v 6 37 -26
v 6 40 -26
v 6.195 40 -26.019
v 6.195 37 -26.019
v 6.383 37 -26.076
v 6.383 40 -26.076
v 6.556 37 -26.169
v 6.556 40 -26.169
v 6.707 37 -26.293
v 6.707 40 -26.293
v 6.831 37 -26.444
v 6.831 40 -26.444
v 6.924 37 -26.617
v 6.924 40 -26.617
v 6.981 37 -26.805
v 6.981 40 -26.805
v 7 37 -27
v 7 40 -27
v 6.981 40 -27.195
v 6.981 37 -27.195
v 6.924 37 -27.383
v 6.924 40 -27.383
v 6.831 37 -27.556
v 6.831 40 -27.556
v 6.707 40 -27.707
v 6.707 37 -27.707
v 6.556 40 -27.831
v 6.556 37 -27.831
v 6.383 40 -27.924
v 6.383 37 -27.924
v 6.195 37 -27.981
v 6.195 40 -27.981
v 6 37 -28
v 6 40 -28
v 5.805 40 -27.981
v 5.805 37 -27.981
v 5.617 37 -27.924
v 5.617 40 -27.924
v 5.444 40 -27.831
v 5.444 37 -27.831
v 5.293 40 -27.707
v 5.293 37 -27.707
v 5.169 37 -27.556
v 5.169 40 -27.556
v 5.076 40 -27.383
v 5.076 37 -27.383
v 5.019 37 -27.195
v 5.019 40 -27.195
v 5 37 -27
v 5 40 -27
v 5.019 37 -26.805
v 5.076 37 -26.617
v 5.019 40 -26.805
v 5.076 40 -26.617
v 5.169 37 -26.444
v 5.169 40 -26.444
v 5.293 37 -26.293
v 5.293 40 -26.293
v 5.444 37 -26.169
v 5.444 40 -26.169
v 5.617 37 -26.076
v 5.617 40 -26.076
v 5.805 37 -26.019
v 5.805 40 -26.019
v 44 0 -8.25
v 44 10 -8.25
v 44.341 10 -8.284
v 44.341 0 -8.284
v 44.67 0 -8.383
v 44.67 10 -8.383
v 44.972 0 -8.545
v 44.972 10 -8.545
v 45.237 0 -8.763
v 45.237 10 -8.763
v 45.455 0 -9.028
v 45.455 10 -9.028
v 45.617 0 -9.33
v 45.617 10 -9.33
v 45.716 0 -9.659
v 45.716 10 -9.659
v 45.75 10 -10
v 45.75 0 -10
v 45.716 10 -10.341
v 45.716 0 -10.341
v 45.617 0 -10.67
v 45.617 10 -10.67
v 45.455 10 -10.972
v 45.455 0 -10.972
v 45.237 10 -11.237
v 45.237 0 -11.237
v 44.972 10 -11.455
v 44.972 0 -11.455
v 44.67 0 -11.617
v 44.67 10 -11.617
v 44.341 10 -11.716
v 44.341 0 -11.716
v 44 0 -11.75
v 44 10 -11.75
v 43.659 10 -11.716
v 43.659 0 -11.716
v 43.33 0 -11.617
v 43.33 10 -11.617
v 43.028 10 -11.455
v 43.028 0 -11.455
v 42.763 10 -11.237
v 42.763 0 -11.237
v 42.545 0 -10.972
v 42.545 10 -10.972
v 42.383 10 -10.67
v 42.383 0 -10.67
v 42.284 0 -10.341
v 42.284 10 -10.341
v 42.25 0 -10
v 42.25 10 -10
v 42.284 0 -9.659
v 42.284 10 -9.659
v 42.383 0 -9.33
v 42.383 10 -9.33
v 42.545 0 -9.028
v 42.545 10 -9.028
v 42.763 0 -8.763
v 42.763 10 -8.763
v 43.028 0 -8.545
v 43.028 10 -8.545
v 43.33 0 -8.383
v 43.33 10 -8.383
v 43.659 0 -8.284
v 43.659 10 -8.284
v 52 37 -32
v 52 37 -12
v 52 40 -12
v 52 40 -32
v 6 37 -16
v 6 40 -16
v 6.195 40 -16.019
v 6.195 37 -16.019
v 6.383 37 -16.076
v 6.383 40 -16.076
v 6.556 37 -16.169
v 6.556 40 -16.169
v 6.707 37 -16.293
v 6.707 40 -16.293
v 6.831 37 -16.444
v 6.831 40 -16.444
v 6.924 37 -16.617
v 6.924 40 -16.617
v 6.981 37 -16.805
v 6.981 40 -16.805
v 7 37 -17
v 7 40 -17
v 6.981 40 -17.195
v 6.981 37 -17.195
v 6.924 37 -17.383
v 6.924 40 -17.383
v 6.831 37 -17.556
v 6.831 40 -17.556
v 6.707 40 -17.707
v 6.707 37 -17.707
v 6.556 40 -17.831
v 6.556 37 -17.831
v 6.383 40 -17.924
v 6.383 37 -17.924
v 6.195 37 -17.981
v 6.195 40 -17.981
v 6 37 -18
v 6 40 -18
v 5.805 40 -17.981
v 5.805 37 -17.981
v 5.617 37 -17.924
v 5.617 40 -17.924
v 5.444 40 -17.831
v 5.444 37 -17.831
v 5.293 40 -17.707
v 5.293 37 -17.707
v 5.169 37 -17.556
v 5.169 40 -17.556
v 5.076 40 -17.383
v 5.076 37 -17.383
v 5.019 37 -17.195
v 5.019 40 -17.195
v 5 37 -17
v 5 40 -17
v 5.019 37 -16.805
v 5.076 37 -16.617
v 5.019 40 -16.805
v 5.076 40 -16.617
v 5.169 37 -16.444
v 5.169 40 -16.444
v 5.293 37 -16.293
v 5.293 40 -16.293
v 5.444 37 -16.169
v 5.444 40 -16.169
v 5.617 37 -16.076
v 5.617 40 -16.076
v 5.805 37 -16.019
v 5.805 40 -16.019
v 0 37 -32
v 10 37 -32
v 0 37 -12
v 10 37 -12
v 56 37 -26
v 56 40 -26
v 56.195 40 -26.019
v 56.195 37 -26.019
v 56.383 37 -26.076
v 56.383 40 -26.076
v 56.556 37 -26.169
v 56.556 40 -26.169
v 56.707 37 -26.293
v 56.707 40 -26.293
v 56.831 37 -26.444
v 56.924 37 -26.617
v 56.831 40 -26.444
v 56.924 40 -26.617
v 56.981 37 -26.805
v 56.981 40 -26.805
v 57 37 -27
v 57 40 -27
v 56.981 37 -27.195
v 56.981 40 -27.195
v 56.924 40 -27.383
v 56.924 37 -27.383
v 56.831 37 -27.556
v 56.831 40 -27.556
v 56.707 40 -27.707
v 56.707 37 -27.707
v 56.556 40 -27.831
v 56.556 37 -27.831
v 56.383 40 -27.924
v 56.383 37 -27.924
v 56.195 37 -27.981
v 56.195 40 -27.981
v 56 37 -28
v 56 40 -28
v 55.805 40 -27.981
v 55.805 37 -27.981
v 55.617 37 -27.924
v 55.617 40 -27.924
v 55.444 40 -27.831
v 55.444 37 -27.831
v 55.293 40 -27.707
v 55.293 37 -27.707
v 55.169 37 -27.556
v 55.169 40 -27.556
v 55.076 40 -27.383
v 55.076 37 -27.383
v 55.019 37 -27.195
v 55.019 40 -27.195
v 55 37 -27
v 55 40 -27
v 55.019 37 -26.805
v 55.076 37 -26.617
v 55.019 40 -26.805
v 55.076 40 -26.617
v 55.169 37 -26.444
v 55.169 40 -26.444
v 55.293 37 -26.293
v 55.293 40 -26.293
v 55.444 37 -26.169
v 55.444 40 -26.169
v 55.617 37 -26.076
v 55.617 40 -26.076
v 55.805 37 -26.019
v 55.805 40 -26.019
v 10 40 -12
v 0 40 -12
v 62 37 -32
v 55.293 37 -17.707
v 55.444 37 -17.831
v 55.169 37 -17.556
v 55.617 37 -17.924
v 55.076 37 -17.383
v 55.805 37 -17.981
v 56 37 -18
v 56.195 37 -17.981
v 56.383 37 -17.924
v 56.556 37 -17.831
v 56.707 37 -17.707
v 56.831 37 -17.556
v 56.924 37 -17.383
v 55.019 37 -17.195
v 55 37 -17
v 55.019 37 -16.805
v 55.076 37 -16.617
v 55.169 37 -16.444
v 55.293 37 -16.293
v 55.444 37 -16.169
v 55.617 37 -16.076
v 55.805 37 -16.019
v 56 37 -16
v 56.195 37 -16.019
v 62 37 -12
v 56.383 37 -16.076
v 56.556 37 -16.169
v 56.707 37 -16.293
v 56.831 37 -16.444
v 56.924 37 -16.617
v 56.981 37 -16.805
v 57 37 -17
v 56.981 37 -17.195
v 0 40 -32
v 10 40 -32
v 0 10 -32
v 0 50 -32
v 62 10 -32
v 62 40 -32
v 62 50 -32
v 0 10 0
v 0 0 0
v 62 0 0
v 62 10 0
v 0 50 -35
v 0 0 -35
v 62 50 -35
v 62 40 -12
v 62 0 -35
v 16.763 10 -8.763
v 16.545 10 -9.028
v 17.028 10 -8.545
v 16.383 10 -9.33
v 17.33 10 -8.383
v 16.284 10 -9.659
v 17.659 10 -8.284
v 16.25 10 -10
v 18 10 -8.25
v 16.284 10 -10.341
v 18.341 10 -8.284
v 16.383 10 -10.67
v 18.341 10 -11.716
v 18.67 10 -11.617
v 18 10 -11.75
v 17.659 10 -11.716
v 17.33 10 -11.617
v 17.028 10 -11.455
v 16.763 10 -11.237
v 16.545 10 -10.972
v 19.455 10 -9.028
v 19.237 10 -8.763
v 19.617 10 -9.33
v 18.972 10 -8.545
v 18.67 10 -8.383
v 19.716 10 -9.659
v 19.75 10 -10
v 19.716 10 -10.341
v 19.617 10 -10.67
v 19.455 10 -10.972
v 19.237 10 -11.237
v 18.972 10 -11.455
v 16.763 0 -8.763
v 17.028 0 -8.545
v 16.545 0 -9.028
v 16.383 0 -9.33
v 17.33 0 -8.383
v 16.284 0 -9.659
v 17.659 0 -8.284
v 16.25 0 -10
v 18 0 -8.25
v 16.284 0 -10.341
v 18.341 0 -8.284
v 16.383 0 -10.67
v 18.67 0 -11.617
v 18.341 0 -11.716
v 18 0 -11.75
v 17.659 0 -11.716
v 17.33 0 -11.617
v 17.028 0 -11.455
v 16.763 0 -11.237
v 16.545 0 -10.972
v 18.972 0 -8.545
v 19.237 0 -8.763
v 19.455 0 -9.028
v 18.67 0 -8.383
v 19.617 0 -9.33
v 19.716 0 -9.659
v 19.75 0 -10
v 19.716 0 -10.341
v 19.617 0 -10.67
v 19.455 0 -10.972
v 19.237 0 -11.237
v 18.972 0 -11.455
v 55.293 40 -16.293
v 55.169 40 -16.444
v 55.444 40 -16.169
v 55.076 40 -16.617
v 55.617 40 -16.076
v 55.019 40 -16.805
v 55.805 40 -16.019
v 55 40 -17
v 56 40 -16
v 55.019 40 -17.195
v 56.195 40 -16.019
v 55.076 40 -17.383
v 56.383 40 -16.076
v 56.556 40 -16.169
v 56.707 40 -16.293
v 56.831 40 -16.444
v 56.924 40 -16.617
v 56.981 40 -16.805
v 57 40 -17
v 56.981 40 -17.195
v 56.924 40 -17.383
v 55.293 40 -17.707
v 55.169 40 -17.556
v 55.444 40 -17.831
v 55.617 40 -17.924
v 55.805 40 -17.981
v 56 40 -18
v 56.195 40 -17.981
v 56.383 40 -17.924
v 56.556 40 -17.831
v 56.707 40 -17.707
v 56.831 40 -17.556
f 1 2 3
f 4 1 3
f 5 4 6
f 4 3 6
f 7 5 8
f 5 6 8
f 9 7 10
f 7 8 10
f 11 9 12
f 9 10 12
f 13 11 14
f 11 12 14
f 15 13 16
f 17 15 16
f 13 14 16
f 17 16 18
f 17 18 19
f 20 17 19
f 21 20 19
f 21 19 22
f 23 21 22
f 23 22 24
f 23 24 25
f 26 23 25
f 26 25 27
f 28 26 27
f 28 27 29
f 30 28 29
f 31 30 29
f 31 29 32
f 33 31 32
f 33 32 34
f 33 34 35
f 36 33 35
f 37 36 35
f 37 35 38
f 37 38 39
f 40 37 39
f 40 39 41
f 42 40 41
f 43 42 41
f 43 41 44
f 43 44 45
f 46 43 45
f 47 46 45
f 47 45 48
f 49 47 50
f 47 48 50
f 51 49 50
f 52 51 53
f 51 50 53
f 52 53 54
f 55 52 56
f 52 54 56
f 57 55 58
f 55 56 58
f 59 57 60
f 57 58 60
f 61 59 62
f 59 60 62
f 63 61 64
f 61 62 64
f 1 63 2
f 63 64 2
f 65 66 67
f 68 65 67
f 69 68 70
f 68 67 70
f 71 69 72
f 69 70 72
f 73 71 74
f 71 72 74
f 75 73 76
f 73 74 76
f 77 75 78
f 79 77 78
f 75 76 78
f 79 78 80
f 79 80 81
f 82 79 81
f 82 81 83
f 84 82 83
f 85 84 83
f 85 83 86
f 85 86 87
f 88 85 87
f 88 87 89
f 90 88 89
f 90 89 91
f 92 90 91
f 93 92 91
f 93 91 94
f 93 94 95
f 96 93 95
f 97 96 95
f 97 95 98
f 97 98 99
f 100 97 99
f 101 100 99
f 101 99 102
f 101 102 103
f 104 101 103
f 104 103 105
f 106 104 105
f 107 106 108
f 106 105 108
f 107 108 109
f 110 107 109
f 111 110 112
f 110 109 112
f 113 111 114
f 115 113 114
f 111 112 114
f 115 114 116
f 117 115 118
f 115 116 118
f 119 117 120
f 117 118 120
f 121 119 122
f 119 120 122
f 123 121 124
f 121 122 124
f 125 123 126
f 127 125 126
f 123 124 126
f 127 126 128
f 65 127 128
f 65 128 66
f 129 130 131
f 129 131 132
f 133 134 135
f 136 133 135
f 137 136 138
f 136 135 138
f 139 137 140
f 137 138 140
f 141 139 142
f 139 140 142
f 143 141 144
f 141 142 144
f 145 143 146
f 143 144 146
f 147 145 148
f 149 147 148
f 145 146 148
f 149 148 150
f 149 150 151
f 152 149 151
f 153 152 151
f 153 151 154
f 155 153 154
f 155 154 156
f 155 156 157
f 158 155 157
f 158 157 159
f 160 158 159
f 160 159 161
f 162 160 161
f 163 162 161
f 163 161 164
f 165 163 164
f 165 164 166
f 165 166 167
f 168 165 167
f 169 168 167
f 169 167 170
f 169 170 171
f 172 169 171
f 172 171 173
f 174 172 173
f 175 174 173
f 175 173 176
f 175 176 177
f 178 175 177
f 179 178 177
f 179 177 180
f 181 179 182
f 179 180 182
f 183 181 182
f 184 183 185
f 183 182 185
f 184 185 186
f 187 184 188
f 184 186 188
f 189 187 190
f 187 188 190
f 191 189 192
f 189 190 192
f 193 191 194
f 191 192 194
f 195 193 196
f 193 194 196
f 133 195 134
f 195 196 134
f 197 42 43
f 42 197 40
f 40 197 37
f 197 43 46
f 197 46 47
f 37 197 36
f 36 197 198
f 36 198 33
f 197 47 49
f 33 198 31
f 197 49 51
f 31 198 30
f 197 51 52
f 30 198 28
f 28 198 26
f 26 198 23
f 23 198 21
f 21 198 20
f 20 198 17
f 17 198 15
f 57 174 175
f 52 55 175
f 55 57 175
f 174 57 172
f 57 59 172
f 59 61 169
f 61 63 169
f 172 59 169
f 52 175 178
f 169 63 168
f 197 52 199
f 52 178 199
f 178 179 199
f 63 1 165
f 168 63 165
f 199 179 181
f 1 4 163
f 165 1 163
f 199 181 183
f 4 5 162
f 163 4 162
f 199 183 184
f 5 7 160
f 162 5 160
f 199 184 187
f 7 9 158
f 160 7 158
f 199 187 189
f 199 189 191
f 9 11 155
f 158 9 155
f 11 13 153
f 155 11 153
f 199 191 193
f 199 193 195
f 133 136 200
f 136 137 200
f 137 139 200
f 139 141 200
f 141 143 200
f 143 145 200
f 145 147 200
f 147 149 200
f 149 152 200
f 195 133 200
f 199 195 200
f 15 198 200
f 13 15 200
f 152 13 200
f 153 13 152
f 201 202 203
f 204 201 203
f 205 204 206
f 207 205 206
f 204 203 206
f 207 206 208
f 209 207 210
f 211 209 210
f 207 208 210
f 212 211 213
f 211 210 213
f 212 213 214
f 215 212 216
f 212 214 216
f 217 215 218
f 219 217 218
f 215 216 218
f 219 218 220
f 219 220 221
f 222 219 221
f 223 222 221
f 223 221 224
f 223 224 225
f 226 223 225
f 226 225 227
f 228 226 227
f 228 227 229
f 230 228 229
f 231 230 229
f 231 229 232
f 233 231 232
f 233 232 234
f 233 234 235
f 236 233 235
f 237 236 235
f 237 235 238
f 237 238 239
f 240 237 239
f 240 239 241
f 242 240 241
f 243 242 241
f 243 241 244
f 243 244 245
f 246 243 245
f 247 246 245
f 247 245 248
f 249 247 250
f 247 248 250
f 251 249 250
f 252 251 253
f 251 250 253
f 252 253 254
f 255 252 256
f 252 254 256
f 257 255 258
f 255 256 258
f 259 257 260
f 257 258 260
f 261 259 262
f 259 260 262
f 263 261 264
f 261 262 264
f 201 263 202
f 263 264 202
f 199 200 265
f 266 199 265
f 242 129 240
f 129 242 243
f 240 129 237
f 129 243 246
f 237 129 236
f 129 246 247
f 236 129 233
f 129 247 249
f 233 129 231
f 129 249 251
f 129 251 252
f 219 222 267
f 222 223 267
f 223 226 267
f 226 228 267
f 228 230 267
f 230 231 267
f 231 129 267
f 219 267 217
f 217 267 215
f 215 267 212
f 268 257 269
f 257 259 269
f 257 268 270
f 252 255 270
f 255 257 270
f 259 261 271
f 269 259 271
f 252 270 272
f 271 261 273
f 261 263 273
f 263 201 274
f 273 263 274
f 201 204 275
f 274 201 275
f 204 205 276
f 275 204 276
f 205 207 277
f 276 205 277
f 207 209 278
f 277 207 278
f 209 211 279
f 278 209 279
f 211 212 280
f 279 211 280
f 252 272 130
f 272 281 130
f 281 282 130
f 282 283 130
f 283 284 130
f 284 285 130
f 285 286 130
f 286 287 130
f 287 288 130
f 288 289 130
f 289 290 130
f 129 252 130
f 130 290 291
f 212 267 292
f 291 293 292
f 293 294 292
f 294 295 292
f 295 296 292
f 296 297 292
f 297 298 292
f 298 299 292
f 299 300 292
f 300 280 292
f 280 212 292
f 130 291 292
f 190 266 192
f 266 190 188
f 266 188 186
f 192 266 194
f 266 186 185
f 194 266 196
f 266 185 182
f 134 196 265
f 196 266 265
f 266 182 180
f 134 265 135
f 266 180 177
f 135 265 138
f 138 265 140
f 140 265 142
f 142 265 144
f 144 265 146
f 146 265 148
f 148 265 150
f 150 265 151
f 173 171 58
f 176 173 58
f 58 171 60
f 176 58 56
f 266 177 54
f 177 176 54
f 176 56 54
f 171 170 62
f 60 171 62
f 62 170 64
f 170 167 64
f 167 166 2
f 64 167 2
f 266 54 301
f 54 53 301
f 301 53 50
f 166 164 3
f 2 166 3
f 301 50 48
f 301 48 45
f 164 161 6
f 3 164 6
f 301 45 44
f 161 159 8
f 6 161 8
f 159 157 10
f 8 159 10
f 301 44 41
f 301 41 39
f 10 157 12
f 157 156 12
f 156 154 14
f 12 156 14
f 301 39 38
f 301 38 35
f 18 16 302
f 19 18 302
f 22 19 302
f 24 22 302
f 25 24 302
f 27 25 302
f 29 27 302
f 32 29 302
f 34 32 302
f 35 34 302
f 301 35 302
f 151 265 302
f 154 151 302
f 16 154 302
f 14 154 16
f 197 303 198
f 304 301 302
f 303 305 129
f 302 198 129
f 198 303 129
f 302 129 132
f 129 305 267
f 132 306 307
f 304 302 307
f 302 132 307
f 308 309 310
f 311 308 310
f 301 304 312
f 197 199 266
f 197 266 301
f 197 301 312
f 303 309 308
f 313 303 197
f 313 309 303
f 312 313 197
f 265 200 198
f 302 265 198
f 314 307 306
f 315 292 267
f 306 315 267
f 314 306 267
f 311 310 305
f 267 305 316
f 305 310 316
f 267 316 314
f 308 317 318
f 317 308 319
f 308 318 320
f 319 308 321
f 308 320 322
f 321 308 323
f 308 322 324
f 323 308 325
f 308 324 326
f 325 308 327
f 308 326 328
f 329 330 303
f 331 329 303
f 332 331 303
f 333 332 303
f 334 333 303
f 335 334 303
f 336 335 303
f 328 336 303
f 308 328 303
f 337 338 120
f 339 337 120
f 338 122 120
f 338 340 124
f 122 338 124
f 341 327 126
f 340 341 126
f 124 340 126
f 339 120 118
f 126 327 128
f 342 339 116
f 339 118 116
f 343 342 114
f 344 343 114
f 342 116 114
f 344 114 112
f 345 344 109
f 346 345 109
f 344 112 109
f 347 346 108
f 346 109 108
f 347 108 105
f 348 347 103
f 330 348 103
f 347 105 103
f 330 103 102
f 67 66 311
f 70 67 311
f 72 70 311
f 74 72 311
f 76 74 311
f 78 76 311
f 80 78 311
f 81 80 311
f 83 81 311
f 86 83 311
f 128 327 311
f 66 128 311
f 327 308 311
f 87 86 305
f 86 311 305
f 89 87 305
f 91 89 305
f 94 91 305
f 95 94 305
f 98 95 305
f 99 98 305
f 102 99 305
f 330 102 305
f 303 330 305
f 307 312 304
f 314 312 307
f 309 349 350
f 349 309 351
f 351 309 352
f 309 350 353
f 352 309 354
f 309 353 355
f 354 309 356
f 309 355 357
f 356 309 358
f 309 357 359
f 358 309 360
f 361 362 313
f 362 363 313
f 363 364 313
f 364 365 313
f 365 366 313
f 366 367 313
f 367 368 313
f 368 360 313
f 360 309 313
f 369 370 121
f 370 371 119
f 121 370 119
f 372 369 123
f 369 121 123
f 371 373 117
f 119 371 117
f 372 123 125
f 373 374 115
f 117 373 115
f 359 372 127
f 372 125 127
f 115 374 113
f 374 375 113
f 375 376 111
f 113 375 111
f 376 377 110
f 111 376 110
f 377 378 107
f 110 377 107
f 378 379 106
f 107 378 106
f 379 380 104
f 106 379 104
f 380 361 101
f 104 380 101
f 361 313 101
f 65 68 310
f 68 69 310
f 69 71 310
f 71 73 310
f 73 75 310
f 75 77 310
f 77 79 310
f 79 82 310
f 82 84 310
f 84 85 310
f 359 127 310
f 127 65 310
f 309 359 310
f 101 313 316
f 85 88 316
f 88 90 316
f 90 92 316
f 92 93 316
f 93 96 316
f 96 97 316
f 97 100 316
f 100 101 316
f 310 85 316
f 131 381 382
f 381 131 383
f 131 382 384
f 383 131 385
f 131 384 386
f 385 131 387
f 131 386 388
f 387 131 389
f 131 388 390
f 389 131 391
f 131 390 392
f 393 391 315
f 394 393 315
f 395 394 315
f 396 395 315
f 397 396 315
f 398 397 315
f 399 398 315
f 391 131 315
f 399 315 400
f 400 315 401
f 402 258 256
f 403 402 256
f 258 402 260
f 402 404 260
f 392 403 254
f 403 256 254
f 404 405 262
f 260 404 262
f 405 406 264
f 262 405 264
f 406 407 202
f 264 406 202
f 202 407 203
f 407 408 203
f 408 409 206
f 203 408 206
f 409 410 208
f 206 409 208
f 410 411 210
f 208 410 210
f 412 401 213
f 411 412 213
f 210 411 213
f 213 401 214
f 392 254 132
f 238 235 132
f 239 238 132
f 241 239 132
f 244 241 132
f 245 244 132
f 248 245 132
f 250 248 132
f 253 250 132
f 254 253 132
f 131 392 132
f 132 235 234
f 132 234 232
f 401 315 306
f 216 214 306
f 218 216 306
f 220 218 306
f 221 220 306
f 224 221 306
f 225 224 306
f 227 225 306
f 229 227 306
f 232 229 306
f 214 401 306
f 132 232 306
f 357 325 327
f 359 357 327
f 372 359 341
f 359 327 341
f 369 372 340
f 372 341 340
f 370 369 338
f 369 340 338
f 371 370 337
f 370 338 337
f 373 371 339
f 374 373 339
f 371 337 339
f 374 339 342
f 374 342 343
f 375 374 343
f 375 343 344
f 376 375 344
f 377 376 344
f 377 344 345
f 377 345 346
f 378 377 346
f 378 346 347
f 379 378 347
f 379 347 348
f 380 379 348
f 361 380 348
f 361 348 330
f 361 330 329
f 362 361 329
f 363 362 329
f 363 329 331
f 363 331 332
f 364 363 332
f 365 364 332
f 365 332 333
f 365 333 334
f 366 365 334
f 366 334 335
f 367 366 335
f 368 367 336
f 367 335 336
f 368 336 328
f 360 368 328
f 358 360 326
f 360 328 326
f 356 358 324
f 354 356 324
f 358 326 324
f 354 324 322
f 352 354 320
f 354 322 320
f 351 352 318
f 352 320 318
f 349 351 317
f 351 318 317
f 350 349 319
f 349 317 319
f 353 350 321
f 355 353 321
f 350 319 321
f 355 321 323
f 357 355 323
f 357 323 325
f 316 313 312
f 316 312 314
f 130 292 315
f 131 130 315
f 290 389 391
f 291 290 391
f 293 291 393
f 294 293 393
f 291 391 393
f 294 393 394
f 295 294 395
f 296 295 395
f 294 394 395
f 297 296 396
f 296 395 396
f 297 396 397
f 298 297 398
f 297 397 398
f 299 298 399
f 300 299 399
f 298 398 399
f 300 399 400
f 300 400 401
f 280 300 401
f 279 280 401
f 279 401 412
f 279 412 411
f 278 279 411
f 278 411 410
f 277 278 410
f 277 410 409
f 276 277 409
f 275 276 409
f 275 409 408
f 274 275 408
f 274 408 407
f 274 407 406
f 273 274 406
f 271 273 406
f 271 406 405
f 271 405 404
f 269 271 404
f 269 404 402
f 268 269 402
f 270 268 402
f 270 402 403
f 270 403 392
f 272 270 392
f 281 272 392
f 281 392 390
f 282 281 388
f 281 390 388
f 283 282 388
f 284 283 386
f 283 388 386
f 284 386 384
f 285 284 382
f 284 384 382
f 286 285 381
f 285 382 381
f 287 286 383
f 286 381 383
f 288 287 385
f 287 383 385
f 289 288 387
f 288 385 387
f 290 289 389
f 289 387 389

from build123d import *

# Parameters (mm, degrees)
SKETCH1_W           = 62
SKETCH1_H           = 35
BOSS_EXTRUDE1_DEPTH = 50
CUT_EXTRUDE3_DEPTH  = 88
SKETCH4_W           = 42
SKETCH4_H           = 20
CUT_EXTRUDE5_DEPTH  = 40
SKETCH5_R           = 1.75
CUT_EXTRUDE7_DEPTH  = 100
CUT_EXTRUDE8_REACH  = 83.664
SKETCH6_R           = 1


with BuildPart() as part:
    # Sketch1 → Boss-Extrude1 (new body)
    with BuildSketch(Plane(origin=(0, 0, 0), x_dir=(1, 0, 0), z_dir=(0, 1, 0))):
        with Locations((31, 17.5)):
            Rectangle(SKETCH1_W, SKETCH1_H)
    extrude(amount=BOSS_EXTRUDE1_DEPTH)

    # Sketch2 → Cut-Extrude3 (cut, through all)
    with BuildSketch(Plane(origin=(62, 0, 0), x_dir=(0, 0, -1), z_dir=(1, 0, 0))):
        Polygon((0, 10), (32, 10), (32, 37), (12, 37), (12, 40), (32, 40), (32, 50), (0, 50), align=None)
    extrude(amount=-CUT_EXTRUDE3_DEPTH, mode=Mode.SUBTRACT)

    # Sketch4 → Cut-Extrude5 (cut)
    with BuildSketch(Plane(origin=(0, 10, 0), x_dir=(1, 0, 0), z_dir=(0, 1, 0))):
        with Locations((31, 22)):
            Rectangle(SKETCH4_W, SKETCH4_H)
    extrude(amount=CUT_EXTRUDE5_DEPTH, mode=Mode.SUBTRACT)

    # Sketch5 → Cut-Extrude7 (cut)
    with BuildSketch(Plane(origin=(0, 10, 0), x_dir=(1, 0, 0), z_dir=(0, 1, 0))):
        with Locations((18, 10)):
            Circle(SKETCH5_R)
        with Locations((44, 10)):
            Circle(SKETCH5_R)
    extrude(amount=-CUT_EXTRUDE7_DEPTH, mode=Mode.SUBTRACT)

    # Sketch6 → Cut-Extrude8 (cut, up to next)
    with BuildSketch(Plane(origin=(0, 40, 0), x_dir=(1, 0, 0), z_dir=(0, 1, 0)), mode=Mode.PRIVATE) as cut_extrude8_sk1:
        with Locations((6, 27)):
            Circle(SKETCH6_R)
    cut_extrude8_tool1 = extrude(cut_extrude8_sk1.sketch, amount=-CUT_EXTRUDE8_REACH, mode=Mode.PRIVATE) & part.part
    # Sketch6 → Cut-Extrude8 (cut, up to next)
    with BuildSketch(Plane(origin=(0, 40, 0), x_dir=(1, 0, 0), z_dir=(0, 1, 0)), mode=Mode.PRIVATE) as cut_extrude8_sk2:
        with Locations((6, 17)):
            Circle(SKETCH6_R)
    cut_extrude8_tool2 = extrude(cut_extrude8_sk2.sketch, amount=-CUT_EXTRUDE8_REACH, mode=Mode.PRIVATE) & part.part
    # Sketch6 → Cut-Extrude8 (cut, up to next)
    with BuildSketch(Plane(origin=(0, 40, 0), x_dir=(1, 0, 0), z_dir=(0, 1, 0)), mode=Mode.PRIVATE) as cut_extrude8_sk3:
        with Locations((56, 17)):
            Circle(SKETCH6_R)
    cut_extrude8_tool3 = extrude(cut_extrude8_sk3.sketch, amount=-CUT_EXTRUDE8_REACH, mode=Mode.PRIVATE) & part.part
    # Sketch6 → Cut-Extrude8 (cut, up to next)
    with BuildSketch(Plane(origin=(0, 40, 0), x_dir=(1, 0, 0), z_dir=(0, 1, 0)), mode=Mode.PRIVATE) as cut_extrude8_sk4:
        with Locations((56, 27)):
            Circle(SKETCH6_R)
    cut_extrude8_tool4 = extrude(cut_extrude8_sk4.sketch, amount=-CUT_EXTRUDE8_REACH, mode=Mode.PRIVATE) & part.part
    add(cut_extrude8_tool1.solids().sort_by_distance((6, 40, -27))[0], mode=Mode.SUBTRACT)
    add(cut_extrude8_tool2.solids().sort_by_distance((6, 40, -17))[0], mode=Mode.SUBTRACT)
    add(cut_extrude8_tool3.solids().sort_by_distance((56, 40, -17))[0], mode=Mode.SUBTRACT)
    add(cut_extrude8_tool4.solids().sort_by_distance((56, 40, -27))[0], mode=Mode.SUBTRACT)


solid = part.part
